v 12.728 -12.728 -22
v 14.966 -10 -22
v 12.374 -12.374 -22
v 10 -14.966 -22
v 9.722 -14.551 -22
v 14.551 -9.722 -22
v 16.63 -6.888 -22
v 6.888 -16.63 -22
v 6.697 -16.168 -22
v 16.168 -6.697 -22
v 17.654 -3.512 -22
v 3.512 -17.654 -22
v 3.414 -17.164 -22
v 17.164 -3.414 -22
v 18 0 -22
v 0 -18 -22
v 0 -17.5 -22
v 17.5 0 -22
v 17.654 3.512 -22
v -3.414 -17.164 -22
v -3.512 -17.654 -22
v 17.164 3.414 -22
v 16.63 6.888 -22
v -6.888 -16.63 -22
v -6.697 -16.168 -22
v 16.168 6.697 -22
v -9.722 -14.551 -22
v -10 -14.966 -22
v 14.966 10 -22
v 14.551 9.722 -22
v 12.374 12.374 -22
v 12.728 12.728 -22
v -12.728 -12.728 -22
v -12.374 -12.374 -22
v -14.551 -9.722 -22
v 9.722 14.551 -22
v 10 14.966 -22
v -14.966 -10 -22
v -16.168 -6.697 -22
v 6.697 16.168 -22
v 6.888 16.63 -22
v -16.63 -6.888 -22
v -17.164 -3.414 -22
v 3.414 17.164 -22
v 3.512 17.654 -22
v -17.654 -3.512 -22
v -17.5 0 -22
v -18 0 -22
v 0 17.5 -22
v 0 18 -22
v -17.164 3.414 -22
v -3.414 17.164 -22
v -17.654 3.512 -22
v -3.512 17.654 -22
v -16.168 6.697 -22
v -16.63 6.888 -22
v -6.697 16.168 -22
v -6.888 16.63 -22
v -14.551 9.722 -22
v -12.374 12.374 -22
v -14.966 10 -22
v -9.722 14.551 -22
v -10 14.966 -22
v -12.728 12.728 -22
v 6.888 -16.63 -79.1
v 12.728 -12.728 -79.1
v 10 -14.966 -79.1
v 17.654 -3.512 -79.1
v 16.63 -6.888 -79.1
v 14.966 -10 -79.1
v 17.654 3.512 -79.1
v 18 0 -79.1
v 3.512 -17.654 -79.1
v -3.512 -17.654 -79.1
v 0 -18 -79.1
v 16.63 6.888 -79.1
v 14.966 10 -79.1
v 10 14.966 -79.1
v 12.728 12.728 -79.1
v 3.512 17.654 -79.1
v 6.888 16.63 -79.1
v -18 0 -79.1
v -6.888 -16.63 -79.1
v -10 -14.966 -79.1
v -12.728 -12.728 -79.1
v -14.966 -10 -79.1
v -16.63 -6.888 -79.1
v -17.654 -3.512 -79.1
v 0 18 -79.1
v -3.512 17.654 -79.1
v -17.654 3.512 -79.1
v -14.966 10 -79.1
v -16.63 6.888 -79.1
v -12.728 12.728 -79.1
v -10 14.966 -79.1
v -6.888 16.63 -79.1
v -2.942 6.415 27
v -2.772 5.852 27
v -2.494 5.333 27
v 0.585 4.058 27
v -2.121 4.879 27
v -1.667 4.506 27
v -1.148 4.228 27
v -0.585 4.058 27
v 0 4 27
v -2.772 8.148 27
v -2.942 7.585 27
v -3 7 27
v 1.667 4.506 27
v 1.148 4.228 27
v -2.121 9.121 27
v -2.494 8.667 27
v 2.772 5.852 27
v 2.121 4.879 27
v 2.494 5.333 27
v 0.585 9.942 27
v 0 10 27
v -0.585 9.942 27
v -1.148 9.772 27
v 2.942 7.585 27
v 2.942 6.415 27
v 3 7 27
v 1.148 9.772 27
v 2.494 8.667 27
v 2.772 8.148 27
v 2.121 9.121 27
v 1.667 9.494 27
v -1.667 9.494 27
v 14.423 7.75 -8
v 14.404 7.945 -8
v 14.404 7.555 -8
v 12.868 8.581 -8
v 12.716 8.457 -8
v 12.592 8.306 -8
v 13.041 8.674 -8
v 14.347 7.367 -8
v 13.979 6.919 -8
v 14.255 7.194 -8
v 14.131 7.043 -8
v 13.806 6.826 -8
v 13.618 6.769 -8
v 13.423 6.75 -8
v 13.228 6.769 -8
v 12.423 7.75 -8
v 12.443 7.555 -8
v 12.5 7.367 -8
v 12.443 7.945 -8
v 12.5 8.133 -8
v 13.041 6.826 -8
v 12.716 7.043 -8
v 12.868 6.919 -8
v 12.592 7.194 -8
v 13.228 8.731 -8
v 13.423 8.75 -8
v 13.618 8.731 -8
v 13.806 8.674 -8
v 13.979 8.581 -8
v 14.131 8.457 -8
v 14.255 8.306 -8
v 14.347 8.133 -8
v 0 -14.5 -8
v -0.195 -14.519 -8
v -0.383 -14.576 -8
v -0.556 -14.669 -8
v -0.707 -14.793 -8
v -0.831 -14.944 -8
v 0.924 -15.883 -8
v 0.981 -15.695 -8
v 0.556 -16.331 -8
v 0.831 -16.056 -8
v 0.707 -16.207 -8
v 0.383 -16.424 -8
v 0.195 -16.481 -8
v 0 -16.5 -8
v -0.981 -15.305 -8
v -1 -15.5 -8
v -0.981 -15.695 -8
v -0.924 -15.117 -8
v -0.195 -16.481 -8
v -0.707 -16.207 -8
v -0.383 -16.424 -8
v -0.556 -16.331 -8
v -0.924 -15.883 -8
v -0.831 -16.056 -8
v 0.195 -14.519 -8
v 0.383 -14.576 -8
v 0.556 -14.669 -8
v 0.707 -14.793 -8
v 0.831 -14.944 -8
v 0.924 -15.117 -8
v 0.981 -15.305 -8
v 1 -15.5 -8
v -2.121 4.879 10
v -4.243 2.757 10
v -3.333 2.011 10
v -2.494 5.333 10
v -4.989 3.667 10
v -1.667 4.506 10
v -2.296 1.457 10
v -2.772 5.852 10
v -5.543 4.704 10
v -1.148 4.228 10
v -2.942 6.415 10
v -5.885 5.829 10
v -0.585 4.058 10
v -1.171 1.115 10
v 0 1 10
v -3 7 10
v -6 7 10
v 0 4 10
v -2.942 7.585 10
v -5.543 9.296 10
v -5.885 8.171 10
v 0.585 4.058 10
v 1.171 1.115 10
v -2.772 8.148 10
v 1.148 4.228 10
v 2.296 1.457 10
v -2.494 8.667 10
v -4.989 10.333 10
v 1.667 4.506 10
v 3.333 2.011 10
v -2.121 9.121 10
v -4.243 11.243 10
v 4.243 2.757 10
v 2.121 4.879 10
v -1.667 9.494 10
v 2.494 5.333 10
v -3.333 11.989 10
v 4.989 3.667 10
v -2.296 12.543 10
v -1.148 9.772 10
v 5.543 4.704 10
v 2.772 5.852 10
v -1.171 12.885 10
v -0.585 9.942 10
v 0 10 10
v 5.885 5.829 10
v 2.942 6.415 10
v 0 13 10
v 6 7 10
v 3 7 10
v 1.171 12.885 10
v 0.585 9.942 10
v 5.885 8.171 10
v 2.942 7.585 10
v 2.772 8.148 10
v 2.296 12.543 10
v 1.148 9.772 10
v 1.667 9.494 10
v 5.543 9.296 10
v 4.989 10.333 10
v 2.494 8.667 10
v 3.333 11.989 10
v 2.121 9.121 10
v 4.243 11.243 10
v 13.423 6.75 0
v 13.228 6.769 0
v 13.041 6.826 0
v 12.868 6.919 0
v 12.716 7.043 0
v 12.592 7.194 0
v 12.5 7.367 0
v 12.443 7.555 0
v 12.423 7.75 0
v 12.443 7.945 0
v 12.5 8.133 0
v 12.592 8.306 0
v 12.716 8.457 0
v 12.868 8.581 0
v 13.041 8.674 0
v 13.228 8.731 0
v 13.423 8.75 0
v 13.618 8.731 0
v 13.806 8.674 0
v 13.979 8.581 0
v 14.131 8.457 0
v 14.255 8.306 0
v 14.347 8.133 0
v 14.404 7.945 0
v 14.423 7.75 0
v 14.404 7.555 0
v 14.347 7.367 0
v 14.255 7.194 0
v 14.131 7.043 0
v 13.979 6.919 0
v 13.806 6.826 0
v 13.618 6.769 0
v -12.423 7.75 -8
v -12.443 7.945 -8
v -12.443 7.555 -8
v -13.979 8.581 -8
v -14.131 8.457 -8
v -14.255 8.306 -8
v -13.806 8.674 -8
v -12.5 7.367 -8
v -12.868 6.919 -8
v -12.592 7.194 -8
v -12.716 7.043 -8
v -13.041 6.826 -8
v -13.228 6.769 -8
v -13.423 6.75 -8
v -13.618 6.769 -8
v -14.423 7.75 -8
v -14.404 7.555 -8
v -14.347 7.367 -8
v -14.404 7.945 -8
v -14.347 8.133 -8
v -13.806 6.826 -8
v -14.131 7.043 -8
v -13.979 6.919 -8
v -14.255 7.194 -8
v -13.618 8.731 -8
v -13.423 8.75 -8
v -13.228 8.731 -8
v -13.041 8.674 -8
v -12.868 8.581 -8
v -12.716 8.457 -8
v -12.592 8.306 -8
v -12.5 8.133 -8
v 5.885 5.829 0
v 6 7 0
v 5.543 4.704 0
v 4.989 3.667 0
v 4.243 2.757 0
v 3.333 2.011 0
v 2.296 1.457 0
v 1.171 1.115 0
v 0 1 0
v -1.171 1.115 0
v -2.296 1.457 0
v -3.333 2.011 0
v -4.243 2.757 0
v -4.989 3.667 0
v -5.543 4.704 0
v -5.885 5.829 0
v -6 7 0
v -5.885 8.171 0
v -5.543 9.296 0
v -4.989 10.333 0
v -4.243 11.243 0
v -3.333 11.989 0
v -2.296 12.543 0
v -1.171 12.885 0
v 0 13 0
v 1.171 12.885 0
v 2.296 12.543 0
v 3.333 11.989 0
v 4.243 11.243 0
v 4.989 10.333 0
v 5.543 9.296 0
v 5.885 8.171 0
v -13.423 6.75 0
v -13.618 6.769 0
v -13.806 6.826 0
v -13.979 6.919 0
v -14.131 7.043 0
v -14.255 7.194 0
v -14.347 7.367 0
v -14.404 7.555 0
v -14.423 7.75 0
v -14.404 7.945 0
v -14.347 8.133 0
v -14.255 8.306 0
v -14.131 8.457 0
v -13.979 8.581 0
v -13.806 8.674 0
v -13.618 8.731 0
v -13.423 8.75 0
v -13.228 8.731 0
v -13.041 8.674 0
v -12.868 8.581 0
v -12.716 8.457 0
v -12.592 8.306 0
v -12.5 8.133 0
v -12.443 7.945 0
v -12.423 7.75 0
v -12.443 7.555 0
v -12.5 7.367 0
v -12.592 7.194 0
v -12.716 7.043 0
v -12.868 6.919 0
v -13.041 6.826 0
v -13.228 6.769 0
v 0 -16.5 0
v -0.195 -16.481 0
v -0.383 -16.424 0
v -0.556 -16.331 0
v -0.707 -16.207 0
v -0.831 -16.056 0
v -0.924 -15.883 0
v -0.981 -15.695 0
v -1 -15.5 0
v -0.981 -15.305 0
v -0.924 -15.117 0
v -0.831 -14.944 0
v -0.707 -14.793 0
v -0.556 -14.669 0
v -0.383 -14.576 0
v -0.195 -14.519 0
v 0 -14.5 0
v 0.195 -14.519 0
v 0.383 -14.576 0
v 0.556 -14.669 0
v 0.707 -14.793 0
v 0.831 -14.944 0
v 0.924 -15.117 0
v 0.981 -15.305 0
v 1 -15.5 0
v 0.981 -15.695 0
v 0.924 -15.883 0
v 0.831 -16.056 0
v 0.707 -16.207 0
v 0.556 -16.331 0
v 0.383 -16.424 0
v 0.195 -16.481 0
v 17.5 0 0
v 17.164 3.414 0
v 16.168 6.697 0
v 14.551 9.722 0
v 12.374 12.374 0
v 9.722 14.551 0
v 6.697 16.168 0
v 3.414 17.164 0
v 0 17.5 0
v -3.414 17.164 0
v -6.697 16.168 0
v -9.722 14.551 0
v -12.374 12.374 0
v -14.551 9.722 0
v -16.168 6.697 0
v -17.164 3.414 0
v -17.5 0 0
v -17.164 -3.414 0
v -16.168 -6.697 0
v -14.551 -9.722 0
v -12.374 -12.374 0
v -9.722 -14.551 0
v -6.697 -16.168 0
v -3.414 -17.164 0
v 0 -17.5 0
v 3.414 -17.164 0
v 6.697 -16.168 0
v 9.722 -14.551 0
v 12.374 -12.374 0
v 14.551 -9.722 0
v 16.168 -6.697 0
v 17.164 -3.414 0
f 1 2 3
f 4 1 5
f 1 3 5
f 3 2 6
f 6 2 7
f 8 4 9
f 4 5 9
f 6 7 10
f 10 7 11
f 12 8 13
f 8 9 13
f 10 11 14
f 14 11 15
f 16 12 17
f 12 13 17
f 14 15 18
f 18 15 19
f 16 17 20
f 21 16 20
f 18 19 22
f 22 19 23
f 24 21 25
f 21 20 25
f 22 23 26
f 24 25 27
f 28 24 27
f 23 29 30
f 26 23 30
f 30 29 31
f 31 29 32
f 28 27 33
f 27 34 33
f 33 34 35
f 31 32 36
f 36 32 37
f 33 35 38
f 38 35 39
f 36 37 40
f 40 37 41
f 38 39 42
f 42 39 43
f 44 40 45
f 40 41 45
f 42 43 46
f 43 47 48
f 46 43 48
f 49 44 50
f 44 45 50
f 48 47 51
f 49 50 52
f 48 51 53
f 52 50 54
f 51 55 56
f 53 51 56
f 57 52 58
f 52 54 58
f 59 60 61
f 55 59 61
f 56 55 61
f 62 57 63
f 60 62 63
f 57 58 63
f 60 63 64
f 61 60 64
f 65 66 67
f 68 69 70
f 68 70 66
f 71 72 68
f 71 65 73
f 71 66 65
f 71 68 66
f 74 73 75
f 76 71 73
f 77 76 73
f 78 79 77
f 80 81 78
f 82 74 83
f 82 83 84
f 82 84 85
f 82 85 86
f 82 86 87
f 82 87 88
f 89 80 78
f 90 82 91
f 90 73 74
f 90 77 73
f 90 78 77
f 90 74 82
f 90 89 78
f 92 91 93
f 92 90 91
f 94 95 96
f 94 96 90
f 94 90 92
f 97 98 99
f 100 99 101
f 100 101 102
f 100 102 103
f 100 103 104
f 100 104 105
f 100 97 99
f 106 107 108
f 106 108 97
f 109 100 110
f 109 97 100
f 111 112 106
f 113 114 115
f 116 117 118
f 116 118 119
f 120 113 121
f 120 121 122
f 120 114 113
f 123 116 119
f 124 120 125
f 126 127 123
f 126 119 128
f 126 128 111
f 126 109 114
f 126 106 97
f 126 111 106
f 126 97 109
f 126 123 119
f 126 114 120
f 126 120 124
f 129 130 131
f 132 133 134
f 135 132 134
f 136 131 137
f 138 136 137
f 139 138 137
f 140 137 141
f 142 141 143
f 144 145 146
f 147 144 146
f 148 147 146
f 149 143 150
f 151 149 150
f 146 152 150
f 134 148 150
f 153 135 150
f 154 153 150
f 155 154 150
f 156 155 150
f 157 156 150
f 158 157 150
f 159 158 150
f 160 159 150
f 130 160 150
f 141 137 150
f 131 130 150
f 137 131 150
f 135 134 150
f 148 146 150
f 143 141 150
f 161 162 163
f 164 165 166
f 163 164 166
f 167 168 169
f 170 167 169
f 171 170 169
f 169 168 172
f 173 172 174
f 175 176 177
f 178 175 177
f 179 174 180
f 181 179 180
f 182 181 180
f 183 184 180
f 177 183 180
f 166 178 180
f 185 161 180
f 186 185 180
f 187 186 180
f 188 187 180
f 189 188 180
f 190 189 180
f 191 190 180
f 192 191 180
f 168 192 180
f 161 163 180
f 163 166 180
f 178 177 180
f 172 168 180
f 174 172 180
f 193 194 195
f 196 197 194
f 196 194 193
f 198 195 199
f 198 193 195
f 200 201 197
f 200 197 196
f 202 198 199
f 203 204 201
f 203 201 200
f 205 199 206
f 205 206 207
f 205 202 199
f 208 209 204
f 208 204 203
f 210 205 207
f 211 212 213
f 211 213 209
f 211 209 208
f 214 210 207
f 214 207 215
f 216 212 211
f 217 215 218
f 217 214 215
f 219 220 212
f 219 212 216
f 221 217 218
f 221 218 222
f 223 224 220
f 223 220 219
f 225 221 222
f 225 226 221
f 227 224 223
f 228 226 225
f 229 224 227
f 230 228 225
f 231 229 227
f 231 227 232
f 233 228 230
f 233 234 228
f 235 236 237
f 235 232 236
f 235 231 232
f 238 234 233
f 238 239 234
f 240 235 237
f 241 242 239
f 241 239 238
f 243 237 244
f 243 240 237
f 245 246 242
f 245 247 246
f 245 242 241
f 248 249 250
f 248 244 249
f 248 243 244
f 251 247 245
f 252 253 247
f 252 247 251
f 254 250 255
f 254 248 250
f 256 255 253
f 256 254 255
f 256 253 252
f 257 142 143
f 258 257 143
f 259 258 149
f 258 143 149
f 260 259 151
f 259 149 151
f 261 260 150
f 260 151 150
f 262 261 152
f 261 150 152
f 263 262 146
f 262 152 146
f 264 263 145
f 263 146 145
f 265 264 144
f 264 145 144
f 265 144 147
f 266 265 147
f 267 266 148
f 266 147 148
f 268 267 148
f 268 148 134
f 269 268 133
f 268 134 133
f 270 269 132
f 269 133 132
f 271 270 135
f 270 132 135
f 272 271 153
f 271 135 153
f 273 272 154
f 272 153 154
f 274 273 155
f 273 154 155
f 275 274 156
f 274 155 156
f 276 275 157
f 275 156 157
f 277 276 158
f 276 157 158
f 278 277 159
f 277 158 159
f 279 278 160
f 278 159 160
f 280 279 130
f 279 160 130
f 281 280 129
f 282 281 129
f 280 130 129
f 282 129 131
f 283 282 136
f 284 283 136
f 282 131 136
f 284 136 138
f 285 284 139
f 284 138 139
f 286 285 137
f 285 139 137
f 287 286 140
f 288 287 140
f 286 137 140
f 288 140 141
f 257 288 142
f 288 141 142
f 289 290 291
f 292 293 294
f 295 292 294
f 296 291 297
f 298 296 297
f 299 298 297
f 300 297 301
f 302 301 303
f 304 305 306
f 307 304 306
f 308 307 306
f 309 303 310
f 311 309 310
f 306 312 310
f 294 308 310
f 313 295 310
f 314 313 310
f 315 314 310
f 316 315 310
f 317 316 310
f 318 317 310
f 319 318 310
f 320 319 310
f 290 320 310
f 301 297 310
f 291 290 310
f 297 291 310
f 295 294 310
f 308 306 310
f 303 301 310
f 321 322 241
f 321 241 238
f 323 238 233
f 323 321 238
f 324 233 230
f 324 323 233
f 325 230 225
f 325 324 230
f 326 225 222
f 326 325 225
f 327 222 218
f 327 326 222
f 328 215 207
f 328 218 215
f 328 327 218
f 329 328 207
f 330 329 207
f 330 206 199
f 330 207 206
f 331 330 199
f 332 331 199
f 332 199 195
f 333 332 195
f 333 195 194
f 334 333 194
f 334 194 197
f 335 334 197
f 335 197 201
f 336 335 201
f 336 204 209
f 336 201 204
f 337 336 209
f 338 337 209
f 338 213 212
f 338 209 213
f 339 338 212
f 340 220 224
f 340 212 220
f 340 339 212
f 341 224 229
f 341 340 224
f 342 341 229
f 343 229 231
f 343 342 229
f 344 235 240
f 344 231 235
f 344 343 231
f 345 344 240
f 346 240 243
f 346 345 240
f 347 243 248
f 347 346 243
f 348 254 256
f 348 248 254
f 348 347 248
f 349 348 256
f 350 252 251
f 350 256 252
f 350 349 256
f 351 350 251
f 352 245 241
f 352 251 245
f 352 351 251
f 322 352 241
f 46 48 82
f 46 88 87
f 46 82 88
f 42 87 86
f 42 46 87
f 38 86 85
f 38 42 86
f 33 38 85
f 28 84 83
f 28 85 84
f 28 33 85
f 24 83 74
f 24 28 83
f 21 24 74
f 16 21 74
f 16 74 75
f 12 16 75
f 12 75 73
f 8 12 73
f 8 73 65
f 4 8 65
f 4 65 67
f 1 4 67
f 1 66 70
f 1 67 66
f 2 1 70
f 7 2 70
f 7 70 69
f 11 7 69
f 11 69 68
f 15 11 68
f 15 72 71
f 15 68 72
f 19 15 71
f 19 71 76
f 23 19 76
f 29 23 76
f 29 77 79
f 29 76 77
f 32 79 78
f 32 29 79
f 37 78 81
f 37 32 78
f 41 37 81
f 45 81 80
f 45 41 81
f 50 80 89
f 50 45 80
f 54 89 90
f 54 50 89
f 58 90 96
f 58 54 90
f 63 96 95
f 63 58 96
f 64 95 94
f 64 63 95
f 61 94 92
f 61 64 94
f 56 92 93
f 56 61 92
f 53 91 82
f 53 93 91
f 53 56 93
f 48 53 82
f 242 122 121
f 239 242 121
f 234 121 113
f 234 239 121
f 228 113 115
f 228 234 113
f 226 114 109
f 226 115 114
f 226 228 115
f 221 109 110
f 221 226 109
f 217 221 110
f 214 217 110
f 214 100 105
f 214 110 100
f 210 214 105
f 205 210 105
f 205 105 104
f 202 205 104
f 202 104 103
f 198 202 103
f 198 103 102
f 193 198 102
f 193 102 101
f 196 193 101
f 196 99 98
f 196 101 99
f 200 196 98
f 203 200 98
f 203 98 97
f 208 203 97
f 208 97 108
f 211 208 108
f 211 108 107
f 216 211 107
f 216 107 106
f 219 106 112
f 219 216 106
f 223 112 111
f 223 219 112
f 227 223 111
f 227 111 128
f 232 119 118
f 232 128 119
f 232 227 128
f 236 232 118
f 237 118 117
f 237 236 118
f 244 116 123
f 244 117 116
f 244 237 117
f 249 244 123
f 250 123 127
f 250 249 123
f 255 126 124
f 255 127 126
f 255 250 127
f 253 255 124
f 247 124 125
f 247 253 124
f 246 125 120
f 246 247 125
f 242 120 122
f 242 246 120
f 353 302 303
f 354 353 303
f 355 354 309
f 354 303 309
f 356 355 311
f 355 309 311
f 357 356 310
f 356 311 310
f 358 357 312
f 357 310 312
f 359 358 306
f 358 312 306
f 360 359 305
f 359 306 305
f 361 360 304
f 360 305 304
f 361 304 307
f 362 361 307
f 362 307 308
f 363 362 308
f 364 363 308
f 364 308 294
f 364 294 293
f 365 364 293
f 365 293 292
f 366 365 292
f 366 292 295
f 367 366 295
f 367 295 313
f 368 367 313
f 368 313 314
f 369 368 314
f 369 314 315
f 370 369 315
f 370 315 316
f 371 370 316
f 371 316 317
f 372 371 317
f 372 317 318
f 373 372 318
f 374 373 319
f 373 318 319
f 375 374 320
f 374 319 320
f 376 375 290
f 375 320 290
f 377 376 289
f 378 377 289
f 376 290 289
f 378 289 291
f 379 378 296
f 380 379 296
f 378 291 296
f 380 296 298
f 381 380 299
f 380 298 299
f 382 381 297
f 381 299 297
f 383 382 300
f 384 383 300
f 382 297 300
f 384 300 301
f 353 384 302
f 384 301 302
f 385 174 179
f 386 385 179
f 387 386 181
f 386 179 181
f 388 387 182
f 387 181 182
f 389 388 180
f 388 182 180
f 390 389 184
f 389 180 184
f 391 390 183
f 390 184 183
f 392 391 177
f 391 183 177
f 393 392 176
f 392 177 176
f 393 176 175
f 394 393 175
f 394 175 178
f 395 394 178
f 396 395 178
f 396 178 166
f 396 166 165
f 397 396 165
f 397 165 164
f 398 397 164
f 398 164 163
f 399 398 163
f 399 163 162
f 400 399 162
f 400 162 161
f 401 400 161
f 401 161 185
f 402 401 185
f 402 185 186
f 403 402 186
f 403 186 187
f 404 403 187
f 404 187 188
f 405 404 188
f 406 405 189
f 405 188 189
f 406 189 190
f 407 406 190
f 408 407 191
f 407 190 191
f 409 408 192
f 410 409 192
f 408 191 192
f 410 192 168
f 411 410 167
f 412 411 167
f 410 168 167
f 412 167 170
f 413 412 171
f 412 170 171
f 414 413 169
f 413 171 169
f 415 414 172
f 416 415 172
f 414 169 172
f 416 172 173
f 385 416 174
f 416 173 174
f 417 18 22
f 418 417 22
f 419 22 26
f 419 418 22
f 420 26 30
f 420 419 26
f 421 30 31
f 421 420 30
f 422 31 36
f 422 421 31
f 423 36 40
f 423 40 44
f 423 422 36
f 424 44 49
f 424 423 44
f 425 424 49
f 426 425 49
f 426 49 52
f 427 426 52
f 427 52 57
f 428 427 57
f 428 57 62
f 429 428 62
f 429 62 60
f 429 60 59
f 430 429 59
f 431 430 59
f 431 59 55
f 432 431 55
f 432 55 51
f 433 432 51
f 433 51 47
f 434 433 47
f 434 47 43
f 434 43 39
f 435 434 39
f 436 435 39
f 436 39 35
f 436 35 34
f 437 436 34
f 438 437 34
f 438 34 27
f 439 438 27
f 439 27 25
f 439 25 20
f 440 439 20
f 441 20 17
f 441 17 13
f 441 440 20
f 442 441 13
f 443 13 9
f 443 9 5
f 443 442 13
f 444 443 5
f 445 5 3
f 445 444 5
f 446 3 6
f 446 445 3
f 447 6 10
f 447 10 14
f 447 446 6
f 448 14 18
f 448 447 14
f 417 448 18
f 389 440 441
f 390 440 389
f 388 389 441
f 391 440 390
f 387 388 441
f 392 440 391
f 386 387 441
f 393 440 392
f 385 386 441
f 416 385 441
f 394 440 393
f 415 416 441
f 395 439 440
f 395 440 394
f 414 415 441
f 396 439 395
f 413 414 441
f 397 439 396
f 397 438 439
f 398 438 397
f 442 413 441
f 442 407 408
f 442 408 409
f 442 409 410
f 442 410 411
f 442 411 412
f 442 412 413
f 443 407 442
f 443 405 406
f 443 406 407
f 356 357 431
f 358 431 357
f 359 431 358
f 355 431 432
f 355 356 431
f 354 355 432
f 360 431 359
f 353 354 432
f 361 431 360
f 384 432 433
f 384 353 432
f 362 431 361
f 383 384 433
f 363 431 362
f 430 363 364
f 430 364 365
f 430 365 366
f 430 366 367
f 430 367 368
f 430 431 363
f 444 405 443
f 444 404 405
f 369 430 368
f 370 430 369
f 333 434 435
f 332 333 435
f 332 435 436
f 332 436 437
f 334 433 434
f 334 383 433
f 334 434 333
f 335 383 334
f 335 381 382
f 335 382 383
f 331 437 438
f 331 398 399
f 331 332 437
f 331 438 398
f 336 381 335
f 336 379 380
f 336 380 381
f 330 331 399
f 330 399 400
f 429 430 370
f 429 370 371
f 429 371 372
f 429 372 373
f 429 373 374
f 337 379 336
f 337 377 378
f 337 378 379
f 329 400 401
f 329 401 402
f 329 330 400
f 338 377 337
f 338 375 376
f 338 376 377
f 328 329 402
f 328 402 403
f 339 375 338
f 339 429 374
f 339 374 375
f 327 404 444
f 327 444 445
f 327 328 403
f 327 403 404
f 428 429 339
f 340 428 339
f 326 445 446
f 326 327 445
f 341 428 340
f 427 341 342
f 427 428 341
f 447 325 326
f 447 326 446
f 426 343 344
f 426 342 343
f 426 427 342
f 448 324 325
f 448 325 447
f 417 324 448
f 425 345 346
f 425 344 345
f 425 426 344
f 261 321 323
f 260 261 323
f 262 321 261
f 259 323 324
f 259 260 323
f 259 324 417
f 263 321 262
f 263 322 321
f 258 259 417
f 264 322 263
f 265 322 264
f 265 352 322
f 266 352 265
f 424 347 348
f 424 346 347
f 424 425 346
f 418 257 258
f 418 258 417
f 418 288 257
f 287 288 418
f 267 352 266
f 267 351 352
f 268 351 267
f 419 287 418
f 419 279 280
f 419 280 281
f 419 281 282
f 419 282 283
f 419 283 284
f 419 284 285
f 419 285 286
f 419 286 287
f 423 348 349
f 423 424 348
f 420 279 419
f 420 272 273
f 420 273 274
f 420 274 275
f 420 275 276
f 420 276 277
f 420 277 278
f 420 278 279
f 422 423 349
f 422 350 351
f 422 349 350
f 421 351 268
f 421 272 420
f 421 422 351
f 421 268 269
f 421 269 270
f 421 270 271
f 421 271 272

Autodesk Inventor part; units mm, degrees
ref_plane "YZ Plane" through (0, 0, 0) normal (1, 0, 0) x (0, 1, 0)
ref_plane "XZ Plane" through (0, 0, 0) normal (0, 1, 0) x (-1, 0, 0)
ref_plane "XY Plane" through (0, 0, 0) normal (0, 0, 1) x (1, 0, 0)
sketch "Skizze1" plane through (0, 0, 0) normal (0, 0, 1) x (1, 0, 0)
  circle A0 centre (0, 0) radius 17.5
  dimension "d0" = 35
extrude "Extrusion1" add sketch "Skizze1" against normal blind 22
sketch "Skizze2" plane through (0, 0, -22) normal (0, 0, -1) x (-1, 0, 0)
  circle A0 centre (0, 0) radius 17.5 projected
  circle A1 centre (0, 0) radius 18
  dimension "d3" = 36
extrude "Extrusion2" add sketch "Skizze2" along normal blind 57.1 contours A0 | A1
sketch "Skizze3" plane through (0, 0, 0) normal (0, 0, 1) x (1, 0, 0)
  circle A0 centre (0, 0) radius 17.5 projected
  circle A1 centre (0, 7) radius 6
  line L0 (0, 0) -> (0, 7) construction
  dimension "d6" = 12
  dimension "d7" = 7
extrude "Extrusion3" add sketch "Skizze3" along normal blind 10 contours A1
sketch "Skizze4" plane through (0, 7, 10) normal (0, 0, 1) x (1, 0, 0)
  circle A0 centre (0, 0) radius 6 projected
  circle A1 centre (0, 0) radius 3
  point P0 (0, -7)
  dimension "d10" = 6
extrude "Extrusion4" add sketch "Skizze4" along normal blind 17 contours A1
ref_plane "Arbeitsebene1" through (0, 7, 10) normal (1, 0, 0) x (0, 0, 1)
sketch "Skizze5" plane through (0, 0, 0) normal (0, 0, 1) x (1, 0, 0)
  circle A0 centre (0, 0) radius 17.5 projected
  circle A1 centre (0, 0) radius 15.5 construction
  line L0 (0, 0) -> (0, -17.5) construction
  line L1 (0, 0) -> (-15.1554, 8.75) construction
  line L2 (0, 0) -> (15.1554, 8.75) construction
  point P0 (-13.4234, 7.75)
  point P1 (13.4234, 7.75)
  point P2 (0, -15.5)
  dimension "d13" = 120
  dimension "d14" = 120
  dimension "d15" = 31
hole "Bohrung1" at (-13.4234, 7.75, 0) at (13.4234, 7.75, 0) at (0, -15.5, 0) direction (0, 0, -1) diameter 2 depth 8
equation "\"d14\" = d13"
properties part number "Conrad Motor" material "Eisen, grau"
